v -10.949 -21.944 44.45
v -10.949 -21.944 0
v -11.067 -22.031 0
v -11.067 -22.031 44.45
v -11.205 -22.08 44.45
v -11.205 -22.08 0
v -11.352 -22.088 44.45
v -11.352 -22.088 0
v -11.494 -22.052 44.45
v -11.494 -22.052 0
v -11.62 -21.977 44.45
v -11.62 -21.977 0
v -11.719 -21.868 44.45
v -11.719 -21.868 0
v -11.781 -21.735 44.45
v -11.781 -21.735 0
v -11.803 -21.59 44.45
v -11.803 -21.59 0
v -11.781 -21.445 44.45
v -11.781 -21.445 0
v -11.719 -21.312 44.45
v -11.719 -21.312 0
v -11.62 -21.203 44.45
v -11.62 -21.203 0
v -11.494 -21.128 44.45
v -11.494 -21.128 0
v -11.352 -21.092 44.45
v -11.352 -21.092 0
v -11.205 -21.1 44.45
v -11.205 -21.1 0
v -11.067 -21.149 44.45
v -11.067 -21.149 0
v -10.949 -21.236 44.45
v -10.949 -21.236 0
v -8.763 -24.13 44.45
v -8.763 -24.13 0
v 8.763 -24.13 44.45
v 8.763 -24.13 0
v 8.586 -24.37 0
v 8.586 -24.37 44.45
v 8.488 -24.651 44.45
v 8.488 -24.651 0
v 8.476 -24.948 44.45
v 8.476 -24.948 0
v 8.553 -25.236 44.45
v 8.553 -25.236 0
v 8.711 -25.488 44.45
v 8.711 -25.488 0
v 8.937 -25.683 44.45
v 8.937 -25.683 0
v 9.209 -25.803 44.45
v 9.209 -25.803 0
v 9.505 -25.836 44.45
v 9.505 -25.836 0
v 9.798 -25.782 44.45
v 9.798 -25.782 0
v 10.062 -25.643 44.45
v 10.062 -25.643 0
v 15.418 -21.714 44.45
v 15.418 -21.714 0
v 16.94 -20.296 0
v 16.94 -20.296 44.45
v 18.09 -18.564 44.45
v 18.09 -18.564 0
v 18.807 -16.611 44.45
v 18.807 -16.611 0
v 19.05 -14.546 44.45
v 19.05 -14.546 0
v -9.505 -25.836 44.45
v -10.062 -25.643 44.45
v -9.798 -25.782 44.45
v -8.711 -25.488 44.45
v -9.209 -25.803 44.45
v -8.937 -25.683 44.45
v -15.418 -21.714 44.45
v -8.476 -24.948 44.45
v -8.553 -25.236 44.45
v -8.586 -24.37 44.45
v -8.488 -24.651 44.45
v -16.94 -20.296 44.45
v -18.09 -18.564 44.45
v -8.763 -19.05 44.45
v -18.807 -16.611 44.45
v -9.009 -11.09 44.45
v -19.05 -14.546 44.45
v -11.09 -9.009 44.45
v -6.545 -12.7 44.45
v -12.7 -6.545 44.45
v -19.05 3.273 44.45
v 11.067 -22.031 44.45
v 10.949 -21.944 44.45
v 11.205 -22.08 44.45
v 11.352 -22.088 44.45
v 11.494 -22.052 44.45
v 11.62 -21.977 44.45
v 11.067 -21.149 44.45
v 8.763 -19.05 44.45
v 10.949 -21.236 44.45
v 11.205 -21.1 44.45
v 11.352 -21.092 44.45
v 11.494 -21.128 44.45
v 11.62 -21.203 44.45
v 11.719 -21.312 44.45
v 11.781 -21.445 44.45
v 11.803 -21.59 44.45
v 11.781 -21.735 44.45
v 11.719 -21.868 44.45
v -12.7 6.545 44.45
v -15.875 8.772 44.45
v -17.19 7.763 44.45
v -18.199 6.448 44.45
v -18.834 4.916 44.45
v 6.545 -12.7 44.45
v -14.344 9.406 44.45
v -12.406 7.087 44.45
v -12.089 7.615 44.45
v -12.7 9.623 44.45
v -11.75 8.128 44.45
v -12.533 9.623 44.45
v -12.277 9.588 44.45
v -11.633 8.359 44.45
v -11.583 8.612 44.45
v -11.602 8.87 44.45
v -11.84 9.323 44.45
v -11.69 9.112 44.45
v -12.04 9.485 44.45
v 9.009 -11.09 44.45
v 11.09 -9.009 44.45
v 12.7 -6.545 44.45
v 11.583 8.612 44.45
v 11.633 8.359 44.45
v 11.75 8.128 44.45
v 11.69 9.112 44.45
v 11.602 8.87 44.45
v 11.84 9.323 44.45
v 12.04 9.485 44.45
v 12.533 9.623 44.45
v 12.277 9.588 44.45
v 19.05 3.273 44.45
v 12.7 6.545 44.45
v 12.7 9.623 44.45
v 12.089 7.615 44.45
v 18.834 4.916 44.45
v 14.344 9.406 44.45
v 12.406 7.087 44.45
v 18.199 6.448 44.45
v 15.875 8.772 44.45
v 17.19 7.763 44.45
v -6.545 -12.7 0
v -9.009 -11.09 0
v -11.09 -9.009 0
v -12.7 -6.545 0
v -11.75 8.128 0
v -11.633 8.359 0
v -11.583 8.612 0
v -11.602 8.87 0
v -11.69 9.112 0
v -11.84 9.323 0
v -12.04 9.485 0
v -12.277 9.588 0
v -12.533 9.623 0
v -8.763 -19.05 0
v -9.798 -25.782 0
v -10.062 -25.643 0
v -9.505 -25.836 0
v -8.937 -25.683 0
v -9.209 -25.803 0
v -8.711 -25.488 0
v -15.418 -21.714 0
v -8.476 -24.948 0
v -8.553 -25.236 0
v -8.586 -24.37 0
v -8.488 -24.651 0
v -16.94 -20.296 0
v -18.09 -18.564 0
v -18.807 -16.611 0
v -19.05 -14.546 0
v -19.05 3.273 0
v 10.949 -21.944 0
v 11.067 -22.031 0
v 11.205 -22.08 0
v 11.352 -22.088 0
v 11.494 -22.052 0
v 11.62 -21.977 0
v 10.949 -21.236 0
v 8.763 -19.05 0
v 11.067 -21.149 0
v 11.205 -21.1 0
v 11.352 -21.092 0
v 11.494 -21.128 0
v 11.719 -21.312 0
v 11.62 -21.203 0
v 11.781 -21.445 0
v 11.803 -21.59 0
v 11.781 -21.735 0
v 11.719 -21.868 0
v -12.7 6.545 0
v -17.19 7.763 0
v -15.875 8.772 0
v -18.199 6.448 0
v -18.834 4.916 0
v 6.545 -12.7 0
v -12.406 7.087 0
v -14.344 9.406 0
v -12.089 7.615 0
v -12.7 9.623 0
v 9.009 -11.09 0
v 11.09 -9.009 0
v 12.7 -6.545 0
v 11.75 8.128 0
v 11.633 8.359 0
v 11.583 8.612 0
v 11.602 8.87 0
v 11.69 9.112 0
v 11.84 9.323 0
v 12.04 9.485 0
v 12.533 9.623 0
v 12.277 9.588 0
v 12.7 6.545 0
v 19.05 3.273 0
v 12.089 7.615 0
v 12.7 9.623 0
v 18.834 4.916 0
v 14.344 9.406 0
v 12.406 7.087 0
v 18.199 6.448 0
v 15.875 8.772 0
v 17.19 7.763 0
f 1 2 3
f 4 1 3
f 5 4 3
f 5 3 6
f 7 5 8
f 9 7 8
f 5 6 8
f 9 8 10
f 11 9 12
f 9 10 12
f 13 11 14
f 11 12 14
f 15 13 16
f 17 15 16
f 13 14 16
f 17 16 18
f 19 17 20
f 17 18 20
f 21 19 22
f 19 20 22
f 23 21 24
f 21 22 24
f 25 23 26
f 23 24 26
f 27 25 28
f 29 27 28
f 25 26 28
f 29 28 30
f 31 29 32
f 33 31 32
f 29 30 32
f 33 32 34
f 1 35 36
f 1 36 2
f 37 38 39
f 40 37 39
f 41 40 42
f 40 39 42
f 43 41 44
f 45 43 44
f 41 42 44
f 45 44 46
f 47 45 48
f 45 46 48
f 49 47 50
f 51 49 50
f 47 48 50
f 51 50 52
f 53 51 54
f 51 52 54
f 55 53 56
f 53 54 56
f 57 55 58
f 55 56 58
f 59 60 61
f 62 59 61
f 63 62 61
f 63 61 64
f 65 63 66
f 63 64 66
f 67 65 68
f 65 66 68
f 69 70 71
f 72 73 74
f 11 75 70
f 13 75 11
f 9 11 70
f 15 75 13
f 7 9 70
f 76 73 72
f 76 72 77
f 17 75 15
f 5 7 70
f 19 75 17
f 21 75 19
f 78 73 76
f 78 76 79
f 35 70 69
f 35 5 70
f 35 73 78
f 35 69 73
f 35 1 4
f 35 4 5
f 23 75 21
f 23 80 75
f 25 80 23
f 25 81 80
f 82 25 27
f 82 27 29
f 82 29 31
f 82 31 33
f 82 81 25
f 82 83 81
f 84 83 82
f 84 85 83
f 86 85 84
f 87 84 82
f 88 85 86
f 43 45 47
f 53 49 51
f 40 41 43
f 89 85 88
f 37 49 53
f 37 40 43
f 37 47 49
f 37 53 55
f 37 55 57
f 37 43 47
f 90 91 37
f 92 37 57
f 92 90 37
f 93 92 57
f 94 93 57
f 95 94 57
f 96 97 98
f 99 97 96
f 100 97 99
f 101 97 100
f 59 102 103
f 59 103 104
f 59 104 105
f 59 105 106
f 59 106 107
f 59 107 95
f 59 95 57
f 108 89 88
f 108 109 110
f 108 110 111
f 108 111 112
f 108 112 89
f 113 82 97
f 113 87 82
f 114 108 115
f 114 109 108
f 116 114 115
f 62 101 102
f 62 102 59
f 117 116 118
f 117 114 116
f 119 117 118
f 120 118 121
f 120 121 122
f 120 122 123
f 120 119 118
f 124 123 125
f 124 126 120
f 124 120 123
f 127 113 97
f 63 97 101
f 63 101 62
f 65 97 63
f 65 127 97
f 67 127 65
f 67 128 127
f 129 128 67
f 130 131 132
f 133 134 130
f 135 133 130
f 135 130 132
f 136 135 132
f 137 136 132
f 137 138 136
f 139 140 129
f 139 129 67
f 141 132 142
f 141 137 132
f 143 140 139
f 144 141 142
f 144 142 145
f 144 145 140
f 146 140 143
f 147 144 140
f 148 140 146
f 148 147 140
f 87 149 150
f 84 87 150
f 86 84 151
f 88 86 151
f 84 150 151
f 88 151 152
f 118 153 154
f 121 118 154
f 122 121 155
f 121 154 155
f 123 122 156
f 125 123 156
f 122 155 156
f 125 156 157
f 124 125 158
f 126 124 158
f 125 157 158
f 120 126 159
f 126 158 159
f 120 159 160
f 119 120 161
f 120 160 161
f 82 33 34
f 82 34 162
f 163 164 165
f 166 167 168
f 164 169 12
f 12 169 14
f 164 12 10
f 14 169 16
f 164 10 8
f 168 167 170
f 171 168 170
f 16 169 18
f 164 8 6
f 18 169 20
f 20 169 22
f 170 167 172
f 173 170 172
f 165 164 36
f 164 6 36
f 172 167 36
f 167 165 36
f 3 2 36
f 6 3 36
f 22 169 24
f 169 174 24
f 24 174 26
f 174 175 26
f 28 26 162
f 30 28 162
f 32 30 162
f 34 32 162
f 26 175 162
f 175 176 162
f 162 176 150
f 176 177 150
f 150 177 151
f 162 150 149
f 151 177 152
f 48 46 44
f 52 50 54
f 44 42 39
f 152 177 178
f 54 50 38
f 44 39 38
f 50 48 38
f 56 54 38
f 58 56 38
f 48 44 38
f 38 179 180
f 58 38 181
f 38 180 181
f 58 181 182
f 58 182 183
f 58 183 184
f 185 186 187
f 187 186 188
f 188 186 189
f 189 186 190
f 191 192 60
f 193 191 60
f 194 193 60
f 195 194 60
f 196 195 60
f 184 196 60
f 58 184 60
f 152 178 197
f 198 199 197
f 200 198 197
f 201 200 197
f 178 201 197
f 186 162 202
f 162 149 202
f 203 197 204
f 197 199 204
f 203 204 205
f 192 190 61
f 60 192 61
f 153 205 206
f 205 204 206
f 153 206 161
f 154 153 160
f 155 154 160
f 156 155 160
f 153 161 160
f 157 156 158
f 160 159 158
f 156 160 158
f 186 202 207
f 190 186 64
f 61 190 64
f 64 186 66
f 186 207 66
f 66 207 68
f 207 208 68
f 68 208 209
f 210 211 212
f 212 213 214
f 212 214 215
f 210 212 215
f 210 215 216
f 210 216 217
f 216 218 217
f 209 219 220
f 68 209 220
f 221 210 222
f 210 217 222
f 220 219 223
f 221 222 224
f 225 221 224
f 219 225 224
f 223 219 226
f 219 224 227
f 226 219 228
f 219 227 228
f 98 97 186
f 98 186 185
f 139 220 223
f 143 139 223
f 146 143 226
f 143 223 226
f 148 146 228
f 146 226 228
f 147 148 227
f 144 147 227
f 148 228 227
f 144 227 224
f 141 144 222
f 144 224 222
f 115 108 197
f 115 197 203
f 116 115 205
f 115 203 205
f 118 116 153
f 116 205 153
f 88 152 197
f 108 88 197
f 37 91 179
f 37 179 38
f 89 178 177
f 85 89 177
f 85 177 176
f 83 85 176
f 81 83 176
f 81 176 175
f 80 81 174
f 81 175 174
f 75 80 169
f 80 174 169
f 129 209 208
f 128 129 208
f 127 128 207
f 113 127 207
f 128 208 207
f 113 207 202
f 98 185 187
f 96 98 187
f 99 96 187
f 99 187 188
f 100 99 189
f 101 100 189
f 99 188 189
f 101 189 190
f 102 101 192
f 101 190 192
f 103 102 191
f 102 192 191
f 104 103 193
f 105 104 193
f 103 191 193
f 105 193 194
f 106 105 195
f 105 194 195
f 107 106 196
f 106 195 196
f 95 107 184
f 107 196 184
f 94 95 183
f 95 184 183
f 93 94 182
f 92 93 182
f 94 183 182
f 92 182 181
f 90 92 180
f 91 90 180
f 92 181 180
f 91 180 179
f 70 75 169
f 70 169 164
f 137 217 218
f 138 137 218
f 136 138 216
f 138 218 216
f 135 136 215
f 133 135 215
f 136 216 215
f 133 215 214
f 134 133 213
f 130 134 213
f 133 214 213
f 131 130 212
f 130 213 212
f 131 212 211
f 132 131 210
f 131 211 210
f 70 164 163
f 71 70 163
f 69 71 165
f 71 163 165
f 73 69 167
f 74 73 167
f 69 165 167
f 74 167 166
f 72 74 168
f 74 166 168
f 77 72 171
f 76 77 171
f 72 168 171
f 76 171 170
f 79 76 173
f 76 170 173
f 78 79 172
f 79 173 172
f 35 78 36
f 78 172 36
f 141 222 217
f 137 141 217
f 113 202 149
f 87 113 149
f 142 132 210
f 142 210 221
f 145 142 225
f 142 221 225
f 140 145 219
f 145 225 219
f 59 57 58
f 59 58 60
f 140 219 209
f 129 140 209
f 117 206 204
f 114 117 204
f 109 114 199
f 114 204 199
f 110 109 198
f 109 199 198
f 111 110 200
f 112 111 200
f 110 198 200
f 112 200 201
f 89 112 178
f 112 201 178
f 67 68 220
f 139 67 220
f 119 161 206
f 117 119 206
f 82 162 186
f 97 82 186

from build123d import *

# Parameters (mm, degrees)
F1_DEPTH = 44.45


with BuildPart() as f1:
    # F0 (on Top) → F1 (new body)
    with BuildSketch(Plane.XY):
        with BuildLine():
            Line((-10.949447, -21.236447), (-8.763, -19.05))
            Line((-8.763, -19.05), (8.763, -19.05))
            Line((8.763, -19.05), (10.949447, -21.236447))
            ThreePointArc((10.949447, -21.236447), (11.803, -21.59), (10.949447, -21.943553))
            Line((10.949447, -21.943553), (8.763, -24.13))
            ThreePointArc((8.763, -24.13), (8.711187, -25.48829), (10.061583, -25.643429))
            Line((10.061583, -25.643429), (15.41822, -21.714082))
            ThreePointArc((15.41822, -21.714082), (18.090248, -18.563741), (19.05, -14.545873))
            Line((19.05, -14.545873), (19.05, 3.272715))
            ThreePointArc((19.05, 3.272715), (17.190128, 7.762843), (12.7, 9.622715))
            Line((12.7, 9.622715), (12.533354, 9.622715))
            ThreePointArc((12.533354, 9.622715), (11.68973, 9.11243), (11.75002, 8.128327))
            ThreePointArc((11.75002, 8.128327), (12.250602, 7.352238), (12.7, 6.54543))
            Line((12.7, 6.54543), (12.7, -6.54543))
            ThreePointArc((12.7, -6.54543), (10.102788, -10.102788), (6.54543, -12.7))
            Line((6.54543, -12.7), (-6.54543, -12.7))
            ThreePointArc((-6.54543, -12.7), (-10.102788, -10.102788), (-12.7, -6.54543))
            Line((-12.7, -6.54543), (-12.7, 6.54543))
            ThreePointArc((-12.7, 6.54543), (-12.250602, 7.352238), (-11.75002, 8.128327))
            ThreePointArc((-11.75002, 8.128327), (-11.68973, 9.11243), (-12.533354, 9.622715))
            Line((-12.533354, 9.622715), (-12.7, 9.622715))
            ThreePointArc((-12.7, 9.622715), (-17.190128, 7.762843), (-19.05, 3.272715))
            Line((-19.05, 3.272715), (-19.05, -14.545873))
            ThreePointArc((-19.05, -14.545873), (-18.090248, -18.563741), (-15.41822, -21.714082))
            Line((-15.41822, -21.714082), (-10.061583, -25.643429))
            ThreePointArc((-10.061583, -25.643429), (-8.711187, -25.48829), (-8.763, -24.13))
            Line((-8.763, -24.13), (-10.949447, -21.943553))
            ThreePointArc((-10.949447, -21.943553), (-11.803, -21.59), (-10.949447, -21.236447))
        make_face()
    extrude(amount=F1_DEPTH)


solid = f1.part
